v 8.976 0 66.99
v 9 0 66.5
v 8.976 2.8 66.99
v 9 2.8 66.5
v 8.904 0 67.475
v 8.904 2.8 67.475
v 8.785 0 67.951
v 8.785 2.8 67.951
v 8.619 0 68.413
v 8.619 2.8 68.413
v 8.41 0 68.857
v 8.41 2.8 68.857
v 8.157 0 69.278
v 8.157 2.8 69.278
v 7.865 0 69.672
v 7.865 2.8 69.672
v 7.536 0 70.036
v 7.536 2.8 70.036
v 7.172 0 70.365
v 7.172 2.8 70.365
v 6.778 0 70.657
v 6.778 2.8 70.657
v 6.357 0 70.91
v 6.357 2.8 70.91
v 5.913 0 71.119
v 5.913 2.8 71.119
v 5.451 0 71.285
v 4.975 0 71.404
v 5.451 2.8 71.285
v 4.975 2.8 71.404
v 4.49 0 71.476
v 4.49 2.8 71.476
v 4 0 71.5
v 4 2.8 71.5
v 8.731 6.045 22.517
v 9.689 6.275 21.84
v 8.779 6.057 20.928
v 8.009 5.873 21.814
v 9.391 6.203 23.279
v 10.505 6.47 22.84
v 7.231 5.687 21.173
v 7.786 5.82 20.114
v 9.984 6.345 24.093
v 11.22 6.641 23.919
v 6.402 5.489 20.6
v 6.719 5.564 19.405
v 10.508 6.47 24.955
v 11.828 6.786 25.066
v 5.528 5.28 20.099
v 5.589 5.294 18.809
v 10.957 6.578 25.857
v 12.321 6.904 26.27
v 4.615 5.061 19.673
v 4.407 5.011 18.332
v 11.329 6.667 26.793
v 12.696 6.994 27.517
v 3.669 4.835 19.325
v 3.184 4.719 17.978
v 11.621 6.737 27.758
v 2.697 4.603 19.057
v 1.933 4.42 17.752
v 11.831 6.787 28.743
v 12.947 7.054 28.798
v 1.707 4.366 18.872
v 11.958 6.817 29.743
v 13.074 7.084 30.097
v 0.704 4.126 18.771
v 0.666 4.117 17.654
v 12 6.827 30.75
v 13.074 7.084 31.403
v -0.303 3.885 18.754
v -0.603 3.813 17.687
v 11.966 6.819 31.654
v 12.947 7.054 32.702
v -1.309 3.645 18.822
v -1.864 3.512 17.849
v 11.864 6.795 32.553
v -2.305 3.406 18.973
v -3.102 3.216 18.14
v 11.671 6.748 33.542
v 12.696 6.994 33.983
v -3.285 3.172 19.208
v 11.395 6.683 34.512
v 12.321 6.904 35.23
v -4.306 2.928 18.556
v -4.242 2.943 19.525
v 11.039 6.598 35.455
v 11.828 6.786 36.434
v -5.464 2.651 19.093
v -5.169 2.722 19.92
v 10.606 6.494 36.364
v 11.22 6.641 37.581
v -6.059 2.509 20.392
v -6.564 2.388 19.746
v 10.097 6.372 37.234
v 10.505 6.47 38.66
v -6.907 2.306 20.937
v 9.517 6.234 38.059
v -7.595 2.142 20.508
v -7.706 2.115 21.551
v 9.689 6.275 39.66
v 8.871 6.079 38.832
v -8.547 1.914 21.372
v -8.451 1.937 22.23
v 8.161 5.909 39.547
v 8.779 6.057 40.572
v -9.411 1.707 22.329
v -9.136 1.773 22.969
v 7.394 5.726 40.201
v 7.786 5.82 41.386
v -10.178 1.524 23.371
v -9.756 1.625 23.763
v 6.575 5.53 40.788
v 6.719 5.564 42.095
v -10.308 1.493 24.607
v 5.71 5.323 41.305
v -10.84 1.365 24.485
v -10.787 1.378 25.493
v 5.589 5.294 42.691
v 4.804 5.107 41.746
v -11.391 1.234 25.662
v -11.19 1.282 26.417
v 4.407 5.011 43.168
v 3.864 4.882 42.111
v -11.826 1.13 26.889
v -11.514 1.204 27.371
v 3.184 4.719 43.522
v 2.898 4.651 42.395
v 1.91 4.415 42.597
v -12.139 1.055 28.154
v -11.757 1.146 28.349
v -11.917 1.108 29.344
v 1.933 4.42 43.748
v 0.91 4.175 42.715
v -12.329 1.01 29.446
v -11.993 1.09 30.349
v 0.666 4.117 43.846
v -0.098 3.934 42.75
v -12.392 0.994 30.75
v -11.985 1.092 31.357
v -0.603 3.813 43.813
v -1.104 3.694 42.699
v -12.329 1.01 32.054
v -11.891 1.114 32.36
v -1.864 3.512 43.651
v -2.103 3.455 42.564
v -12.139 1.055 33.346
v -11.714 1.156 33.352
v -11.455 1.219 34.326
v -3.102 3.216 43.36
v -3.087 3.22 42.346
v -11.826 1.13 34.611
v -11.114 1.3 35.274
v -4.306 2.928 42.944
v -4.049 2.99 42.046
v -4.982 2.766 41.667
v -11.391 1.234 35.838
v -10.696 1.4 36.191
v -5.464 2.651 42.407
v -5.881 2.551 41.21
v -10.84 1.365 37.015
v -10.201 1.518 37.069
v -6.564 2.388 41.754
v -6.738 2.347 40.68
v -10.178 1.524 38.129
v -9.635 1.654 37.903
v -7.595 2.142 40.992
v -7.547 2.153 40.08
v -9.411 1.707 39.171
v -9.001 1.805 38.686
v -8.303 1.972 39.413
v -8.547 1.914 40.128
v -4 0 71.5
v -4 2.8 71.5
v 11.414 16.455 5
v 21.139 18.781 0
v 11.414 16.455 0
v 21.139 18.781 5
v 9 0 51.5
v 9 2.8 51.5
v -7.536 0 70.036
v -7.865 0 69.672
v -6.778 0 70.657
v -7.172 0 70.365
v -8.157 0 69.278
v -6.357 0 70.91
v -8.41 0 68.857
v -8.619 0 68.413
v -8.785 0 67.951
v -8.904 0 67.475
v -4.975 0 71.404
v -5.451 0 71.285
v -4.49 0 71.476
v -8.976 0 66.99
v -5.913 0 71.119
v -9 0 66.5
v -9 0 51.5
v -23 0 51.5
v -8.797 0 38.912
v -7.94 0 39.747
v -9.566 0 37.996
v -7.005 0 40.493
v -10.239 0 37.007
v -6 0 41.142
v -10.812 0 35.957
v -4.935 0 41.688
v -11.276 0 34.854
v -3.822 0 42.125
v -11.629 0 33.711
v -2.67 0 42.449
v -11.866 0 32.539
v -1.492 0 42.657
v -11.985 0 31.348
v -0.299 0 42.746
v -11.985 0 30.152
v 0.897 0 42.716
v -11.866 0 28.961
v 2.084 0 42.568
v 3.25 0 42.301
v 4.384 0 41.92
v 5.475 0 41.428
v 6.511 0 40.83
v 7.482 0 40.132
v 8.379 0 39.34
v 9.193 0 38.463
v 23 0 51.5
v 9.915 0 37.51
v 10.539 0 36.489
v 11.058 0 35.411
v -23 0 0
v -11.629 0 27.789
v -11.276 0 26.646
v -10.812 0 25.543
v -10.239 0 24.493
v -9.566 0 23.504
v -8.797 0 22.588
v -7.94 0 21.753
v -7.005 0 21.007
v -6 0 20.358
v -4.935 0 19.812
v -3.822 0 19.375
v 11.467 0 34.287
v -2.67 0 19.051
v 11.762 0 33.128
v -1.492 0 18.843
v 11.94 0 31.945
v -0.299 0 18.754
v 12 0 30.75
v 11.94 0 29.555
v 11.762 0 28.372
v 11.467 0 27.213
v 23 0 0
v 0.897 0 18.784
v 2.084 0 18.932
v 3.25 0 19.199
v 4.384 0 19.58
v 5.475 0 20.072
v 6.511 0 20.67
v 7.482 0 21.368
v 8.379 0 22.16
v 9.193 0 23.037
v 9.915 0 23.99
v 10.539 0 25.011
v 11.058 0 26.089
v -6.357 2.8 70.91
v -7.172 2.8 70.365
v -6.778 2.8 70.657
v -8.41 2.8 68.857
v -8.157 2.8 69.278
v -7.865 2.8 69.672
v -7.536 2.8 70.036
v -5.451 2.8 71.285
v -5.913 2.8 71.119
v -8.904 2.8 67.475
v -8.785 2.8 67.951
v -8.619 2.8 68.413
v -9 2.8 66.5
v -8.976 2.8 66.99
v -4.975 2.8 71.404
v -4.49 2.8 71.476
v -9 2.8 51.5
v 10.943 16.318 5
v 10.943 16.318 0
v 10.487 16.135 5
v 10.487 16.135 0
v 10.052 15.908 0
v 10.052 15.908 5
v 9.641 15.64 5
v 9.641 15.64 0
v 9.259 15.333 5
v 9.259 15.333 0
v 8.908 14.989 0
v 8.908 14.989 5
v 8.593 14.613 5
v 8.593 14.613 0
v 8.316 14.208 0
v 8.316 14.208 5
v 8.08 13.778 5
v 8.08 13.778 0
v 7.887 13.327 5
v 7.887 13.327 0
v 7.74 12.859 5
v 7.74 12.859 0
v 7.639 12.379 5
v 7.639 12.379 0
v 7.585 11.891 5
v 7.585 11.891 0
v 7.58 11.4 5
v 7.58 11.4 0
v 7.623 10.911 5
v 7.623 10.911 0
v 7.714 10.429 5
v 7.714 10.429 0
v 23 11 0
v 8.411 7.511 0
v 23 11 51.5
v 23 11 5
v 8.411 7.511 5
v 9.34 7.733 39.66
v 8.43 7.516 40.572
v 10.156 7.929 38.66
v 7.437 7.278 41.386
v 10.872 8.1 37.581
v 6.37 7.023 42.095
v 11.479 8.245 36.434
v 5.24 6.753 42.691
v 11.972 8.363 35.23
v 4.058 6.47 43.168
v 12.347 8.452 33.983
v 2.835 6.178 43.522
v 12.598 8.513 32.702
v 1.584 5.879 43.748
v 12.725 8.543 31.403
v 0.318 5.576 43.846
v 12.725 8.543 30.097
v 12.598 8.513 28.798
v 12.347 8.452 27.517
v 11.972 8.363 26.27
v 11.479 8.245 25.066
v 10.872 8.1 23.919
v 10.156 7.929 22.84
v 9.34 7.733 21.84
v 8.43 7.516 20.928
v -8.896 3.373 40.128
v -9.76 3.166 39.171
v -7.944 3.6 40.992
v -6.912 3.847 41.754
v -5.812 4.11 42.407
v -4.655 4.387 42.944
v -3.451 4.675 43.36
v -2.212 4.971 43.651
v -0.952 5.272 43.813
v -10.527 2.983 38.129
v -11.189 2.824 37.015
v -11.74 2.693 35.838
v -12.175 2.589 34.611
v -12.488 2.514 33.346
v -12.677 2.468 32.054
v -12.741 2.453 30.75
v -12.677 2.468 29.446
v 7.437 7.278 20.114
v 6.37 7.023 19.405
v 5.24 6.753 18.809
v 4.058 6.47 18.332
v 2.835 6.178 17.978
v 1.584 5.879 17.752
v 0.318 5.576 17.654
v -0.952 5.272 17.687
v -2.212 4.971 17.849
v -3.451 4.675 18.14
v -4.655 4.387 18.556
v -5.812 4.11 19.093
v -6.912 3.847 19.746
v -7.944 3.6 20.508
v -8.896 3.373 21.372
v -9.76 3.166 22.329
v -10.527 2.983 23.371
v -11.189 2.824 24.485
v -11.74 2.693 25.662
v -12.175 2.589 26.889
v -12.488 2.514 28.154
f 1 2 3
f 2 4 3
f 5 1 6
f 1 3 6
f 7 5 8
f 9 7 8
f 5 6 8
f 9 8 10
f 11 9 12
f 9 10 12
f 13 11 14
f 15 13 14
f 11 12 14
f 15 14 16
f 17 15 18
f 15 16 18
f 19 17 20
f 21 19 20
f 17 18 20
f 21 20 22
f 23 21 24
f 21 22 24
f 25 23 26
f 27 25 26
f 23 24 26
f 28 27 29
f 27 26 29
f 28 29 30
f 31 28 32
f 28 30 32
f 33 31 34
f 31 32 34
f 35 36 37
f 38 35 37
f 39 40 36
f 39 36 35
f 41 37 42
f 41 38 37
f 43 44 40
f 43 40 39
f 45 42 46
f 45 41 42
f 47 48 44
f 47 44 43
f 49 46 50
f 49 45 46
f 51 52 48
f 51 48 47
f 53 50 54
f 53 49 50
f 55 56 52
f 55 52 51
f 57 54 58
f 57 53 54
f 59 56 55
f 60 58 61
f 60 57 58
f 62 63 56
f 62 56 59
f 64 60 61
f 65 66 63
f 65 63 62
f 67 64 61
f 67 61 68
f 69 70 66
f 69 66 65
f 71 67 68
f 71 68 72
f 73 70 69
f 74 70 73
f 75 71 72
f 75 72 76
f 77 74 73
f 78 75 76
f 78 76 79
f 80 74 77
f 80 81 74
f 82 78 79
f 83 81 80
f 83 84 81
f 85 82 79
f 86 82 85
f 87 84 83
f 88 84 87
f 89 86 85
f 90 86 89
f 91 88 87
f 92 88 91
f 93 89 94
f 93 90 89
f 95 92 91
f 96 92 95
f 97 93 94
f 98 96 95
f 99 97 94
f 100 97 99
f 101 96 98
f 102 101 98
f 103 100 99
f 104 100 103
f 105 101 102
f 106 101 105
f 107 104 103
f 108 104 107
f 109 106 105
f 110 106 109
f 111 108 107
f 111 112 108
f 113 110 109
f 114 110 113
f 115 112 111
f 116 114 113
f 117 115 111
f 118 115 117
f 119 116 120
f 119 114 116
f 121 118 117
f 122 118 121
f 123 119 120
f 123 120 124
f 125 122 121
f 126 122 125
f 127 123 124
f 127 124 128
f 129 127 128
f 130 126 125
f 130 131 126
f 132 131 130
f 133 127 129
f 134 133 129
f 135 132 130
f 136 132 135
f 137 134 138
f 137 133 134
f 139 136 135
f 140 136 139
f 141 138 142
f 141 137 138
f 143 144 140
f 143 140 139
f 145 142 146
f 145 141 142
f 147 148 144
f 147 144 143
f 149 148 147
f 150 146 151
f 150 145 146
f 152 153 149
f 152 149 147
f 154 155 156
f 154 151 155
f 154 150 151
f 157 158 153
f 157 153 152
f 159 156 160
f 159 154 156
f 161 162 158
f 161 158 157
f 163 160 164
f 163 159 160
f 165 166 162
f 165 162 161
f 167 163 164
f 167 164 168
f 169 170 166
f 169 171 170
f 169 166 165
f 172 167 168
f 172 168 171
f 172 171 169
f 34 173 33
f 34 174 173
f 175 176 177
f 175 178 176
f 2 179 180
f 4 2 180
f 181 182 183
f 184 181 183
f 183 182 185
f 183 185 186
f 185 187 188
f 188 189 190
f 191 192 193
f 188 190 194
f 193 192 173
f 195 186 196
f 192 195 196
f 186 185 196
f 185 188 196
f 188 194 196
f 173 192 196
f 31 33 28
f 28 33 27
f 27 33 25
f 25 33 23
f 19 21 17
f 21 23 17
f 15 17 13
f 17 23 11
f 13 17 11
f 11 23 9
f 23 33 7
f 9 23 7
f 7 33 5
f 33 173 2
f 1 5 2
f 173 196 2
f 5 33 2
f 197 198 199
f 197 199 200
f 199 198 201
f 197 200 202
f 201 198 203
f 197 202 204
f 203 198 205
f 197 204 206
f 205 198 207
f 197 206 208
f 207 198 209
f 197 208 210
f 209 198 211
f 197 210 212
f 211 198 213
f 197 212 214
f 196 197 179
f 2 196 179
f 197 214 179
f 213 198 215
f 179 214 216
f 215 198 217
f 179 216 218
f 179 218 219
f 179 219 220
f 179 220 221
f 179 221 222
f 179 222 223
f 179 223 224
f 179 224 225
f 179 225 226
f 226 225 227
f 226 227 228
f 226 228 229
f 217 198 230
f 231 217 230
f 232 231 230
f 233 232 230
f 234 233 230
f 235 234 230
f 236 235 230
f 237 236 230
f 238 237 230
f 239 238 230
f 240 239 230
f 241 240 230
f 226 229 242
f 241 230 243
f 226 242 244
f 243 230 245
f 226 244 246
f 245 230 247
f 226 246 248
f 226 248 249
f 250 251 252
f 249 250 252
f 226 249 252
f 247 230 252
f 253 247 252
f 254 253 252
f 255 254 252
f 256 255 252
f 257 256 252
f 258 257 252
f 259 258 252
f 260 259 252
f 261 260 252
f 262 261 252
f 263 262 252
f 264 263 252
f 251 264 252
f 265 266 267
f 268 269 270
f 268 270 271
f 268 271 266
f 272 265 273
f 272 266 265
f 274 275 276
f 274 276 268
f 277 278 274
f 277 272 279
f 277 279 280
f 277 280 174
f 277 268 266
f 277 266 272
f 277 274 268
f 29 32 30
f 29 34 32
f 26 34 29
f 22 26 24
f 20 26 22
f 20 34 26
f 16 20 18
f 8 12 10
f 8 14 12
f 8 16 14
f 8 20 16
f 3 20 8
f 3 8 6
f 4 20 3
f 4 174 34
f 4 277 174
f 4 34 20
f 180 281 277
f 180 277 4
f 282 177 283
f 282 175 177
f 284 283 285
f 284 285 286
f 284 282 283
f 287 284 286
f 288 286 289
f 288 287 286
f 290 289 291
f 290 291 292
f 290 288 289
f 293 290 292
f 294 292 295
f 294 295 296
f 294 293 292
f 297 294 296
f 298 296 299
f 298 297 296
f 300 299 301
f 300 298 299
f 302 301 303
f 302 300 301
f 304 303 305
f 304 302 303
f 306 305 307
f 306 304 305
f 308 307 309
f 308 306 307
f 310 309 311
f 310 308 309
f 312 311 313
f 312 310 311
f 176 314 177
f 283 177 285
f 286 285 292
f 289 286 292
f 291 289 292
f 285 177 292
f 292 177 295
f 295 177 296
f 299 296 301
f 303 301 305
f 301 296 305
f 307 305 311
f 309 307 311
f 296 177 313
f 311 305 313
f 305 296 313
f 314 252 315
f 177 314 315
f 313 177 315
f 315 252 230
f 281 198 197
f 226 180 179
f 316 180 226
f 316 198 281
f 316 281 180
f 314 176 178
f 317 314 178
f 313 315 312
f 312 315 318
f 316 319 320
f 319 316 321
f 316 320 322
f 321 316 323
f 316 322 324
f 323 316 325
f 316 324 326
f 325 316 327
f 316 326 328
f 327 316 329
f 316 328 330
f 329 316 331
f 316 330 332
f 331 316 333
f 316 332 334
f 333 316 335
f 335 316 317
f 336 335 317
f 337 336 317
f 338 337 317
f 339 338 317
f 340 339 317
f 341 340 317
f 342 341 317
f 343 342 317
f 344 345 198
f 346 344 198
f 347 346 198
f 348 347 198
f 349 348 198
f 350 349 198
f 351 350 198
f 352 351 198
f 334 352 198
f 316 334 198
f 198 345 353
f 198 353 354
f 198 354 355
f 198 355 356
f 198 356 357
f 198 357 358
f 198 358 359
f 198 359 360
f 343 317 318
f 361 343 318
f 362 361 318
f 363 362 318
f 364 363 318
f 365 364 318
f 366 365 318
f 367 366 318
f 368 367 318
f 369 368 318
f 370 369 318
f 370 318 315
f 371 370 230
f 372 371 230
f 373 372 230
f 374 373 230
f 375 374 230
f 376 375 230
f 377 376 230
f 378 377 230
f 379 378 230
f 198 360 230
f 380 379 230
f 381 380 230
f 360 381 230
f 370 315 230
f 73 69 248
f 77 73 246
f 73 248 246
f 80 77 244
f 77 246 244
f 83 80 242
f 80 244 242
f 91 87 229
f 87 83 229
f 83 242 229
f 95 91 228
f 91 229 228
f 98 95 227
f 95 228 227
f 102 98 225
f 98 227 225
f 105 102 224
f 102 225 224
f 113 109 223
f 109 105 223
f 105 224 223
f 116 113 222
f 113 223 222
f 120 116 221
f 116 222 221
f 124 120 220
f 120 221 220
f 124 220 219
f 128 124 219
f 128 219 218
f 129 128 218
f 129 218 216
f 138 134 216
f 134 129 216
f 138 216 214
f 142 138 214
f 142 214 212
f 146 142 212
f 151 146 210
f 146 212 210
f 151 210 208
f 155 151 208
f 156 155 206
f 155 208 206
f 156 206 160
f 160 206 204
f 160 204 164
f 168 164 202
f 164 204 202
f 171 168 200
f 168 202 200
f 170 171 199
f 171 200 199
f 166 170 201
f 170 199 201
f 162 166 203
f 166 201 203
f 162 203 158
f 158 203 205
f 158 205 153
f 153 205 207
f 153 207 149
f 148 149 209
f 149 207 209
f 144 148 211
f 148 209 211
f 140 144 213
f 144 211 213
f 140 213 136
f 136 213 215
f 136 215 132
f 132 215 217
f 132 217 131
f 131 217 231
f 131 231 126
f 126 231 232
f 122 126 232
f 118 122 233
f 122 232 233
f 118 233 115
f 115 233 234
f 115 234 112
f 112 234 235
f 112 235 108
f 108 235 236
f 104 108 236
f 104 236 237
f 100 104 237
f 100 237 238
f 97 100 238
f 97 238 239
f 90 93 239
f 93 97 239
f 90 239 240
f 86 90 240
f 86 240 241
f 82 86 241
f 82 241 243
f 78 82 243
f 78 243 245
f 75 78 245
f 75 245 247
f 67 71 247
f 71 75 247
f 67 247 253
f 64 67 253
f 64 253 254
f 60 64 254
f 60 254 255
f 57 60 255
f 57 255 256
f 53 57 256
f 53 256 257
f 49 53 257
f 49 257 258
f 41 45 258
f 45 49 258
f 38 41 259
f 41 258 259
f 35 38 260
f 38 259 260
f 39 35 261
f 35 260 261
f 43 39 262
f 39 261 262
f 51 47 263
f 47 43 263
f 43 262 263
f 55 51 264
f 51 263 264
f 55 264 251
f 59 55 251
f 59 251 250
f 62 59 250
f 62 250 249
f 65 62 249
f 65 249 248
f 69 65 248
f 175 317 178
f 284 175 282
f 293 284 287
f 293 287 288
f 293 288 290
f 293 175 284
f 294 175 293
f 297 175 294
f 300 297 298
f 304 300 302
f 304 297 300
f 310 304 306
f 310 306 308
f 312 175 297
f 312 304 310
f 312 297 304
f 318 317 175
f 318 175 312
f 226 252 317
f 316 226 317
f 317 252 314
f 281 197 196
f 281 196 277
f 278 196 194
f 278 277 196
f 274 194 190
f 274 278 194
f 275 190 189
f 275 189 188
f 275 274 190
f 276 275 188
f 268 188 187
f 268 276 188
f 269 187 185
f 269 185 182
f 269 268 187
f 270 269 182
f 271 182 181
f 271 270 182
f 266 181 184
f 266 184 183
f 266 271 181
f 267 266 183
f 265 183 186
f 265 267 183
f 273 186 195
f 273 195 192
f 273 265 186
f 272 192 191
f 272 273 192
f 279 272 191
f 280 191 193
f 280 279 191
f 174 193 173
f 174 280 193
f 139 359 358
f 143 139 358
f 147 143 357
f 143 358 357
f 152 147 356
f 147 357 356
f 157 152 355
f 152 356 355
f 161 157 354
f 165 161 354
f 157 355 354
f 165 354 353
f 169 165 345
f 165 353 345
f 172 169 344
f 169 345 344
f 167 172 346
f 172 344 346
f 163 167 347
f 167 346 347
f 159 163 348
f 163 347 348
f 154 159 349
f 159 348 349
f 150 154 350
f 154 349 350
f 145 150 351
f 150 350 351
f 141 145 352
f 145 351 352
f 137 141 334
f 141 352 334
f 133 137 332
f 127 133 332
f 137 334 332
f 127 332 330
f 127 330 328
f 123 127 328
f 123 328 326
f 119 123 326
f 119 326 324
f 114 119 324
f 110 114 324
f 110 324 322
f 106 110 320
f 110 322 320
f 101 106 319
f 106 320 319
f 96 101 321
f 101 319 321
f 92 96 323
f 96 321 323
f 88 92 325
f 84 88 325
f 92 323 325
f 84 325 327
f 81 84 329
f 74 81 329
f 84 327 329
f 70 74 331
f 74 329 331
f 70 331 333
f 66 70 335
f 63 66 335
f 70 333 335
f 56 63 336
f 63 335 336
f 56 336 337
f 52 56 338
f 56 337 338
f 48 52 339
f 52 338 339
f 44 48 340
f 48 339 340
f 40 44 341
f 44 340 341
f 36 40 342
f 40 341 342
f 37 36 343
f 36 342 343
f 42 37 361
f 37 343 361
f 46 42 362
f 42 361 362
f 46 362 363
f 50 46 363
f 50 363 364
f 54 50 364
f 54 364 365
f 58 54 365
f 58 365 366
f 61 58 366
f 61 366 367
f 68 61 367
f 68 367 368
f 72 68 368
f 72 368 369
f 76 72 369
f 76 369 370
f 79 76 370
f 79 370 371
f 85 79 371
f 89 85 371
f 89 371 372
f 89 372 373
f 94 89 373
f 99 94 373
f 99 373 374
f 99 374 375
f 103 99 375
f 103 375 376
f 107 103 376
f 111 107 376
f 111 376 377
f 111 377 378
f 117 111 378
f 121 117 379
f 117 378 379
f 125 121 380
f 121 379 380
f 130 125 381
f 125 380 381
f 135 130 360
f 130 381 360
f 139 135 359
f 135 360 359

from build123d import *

# Parameters (mm, degrees)
F1_DEPTH = 51.5
F2_R     = 12
F3_DEPTH = 11.001
F4_R     = 13.1
F5_DEPTH = 1.5
F6_W     = 15
F6_H     = 5
F7_DEPTH = 8
F8_W     = 18
F8_H     = 2.8
F9_DEPTH = 20
F10_R    = 5


with BuildPart() as f1:
    # F0 (on Top) → F1 (new body)
    with BuildSketch(Plane.XY):
        Polygon((23, 11), (-23, 0), (23, 0), align=None)
    extrude(amount=F1_DEPTH)

    # F2 (on face) → F3 (cut, through all)
    with BuildSketch(Plane.XZ):
        with Locations((0, 30.75)):
            Circle(F2_R)
    extrude(amount=-F3_DEPTH, mode=Mode.SUBTRACT)

    # F4 (on face) → F5 (cut)
    with BuildSketch(Plane(origin=(-1.2440768887, 5.2025033527, 0), x_dir=(-0.9725788917, -0.2325732132, 0), z_dir=(-0.2325732132, 0.9725788917, 0))):
        with Locations((-1.2791526727, 30.75)):
            Circle(F4_R)
    extrude(amount=-F5_DEPTH, mode=Mode.SUBTRACT)

    # F6 (on face) → F7 (join)
    with BuildSketch(Plane(origin=(-1.2440768887, 5.2025033527, 0), x_dir=(-0.9725788917, -0.2325732132, 0), z_dir=(-0.2325732132, 0.9725788917, 0))):
        with Locations((-17.4276198535, 2.5)):
            Rectangle(F6_W, F6_H)
    extrude(amount=F7_DEPTH)

    # F8 (on face) → F9 (join)
    with BuildSketch(Plane.XY.offset(51.5)):
        with Locations((0, 1.4)):
            Rectangle(F8_W, F8_H)
    extrude(amount=F9_DEPTH)

    # F10
    f10_edges = [f1.edges().sort_by_distance(p)[0] for p in [
        (6.550731, 15.292033, 2.5),
        (-9, 1.4, 71.5),
        (9, 1.4, 71.5),
    ]]
    fillet(f10_edges, radius=F10_R)


solid = f1.part
